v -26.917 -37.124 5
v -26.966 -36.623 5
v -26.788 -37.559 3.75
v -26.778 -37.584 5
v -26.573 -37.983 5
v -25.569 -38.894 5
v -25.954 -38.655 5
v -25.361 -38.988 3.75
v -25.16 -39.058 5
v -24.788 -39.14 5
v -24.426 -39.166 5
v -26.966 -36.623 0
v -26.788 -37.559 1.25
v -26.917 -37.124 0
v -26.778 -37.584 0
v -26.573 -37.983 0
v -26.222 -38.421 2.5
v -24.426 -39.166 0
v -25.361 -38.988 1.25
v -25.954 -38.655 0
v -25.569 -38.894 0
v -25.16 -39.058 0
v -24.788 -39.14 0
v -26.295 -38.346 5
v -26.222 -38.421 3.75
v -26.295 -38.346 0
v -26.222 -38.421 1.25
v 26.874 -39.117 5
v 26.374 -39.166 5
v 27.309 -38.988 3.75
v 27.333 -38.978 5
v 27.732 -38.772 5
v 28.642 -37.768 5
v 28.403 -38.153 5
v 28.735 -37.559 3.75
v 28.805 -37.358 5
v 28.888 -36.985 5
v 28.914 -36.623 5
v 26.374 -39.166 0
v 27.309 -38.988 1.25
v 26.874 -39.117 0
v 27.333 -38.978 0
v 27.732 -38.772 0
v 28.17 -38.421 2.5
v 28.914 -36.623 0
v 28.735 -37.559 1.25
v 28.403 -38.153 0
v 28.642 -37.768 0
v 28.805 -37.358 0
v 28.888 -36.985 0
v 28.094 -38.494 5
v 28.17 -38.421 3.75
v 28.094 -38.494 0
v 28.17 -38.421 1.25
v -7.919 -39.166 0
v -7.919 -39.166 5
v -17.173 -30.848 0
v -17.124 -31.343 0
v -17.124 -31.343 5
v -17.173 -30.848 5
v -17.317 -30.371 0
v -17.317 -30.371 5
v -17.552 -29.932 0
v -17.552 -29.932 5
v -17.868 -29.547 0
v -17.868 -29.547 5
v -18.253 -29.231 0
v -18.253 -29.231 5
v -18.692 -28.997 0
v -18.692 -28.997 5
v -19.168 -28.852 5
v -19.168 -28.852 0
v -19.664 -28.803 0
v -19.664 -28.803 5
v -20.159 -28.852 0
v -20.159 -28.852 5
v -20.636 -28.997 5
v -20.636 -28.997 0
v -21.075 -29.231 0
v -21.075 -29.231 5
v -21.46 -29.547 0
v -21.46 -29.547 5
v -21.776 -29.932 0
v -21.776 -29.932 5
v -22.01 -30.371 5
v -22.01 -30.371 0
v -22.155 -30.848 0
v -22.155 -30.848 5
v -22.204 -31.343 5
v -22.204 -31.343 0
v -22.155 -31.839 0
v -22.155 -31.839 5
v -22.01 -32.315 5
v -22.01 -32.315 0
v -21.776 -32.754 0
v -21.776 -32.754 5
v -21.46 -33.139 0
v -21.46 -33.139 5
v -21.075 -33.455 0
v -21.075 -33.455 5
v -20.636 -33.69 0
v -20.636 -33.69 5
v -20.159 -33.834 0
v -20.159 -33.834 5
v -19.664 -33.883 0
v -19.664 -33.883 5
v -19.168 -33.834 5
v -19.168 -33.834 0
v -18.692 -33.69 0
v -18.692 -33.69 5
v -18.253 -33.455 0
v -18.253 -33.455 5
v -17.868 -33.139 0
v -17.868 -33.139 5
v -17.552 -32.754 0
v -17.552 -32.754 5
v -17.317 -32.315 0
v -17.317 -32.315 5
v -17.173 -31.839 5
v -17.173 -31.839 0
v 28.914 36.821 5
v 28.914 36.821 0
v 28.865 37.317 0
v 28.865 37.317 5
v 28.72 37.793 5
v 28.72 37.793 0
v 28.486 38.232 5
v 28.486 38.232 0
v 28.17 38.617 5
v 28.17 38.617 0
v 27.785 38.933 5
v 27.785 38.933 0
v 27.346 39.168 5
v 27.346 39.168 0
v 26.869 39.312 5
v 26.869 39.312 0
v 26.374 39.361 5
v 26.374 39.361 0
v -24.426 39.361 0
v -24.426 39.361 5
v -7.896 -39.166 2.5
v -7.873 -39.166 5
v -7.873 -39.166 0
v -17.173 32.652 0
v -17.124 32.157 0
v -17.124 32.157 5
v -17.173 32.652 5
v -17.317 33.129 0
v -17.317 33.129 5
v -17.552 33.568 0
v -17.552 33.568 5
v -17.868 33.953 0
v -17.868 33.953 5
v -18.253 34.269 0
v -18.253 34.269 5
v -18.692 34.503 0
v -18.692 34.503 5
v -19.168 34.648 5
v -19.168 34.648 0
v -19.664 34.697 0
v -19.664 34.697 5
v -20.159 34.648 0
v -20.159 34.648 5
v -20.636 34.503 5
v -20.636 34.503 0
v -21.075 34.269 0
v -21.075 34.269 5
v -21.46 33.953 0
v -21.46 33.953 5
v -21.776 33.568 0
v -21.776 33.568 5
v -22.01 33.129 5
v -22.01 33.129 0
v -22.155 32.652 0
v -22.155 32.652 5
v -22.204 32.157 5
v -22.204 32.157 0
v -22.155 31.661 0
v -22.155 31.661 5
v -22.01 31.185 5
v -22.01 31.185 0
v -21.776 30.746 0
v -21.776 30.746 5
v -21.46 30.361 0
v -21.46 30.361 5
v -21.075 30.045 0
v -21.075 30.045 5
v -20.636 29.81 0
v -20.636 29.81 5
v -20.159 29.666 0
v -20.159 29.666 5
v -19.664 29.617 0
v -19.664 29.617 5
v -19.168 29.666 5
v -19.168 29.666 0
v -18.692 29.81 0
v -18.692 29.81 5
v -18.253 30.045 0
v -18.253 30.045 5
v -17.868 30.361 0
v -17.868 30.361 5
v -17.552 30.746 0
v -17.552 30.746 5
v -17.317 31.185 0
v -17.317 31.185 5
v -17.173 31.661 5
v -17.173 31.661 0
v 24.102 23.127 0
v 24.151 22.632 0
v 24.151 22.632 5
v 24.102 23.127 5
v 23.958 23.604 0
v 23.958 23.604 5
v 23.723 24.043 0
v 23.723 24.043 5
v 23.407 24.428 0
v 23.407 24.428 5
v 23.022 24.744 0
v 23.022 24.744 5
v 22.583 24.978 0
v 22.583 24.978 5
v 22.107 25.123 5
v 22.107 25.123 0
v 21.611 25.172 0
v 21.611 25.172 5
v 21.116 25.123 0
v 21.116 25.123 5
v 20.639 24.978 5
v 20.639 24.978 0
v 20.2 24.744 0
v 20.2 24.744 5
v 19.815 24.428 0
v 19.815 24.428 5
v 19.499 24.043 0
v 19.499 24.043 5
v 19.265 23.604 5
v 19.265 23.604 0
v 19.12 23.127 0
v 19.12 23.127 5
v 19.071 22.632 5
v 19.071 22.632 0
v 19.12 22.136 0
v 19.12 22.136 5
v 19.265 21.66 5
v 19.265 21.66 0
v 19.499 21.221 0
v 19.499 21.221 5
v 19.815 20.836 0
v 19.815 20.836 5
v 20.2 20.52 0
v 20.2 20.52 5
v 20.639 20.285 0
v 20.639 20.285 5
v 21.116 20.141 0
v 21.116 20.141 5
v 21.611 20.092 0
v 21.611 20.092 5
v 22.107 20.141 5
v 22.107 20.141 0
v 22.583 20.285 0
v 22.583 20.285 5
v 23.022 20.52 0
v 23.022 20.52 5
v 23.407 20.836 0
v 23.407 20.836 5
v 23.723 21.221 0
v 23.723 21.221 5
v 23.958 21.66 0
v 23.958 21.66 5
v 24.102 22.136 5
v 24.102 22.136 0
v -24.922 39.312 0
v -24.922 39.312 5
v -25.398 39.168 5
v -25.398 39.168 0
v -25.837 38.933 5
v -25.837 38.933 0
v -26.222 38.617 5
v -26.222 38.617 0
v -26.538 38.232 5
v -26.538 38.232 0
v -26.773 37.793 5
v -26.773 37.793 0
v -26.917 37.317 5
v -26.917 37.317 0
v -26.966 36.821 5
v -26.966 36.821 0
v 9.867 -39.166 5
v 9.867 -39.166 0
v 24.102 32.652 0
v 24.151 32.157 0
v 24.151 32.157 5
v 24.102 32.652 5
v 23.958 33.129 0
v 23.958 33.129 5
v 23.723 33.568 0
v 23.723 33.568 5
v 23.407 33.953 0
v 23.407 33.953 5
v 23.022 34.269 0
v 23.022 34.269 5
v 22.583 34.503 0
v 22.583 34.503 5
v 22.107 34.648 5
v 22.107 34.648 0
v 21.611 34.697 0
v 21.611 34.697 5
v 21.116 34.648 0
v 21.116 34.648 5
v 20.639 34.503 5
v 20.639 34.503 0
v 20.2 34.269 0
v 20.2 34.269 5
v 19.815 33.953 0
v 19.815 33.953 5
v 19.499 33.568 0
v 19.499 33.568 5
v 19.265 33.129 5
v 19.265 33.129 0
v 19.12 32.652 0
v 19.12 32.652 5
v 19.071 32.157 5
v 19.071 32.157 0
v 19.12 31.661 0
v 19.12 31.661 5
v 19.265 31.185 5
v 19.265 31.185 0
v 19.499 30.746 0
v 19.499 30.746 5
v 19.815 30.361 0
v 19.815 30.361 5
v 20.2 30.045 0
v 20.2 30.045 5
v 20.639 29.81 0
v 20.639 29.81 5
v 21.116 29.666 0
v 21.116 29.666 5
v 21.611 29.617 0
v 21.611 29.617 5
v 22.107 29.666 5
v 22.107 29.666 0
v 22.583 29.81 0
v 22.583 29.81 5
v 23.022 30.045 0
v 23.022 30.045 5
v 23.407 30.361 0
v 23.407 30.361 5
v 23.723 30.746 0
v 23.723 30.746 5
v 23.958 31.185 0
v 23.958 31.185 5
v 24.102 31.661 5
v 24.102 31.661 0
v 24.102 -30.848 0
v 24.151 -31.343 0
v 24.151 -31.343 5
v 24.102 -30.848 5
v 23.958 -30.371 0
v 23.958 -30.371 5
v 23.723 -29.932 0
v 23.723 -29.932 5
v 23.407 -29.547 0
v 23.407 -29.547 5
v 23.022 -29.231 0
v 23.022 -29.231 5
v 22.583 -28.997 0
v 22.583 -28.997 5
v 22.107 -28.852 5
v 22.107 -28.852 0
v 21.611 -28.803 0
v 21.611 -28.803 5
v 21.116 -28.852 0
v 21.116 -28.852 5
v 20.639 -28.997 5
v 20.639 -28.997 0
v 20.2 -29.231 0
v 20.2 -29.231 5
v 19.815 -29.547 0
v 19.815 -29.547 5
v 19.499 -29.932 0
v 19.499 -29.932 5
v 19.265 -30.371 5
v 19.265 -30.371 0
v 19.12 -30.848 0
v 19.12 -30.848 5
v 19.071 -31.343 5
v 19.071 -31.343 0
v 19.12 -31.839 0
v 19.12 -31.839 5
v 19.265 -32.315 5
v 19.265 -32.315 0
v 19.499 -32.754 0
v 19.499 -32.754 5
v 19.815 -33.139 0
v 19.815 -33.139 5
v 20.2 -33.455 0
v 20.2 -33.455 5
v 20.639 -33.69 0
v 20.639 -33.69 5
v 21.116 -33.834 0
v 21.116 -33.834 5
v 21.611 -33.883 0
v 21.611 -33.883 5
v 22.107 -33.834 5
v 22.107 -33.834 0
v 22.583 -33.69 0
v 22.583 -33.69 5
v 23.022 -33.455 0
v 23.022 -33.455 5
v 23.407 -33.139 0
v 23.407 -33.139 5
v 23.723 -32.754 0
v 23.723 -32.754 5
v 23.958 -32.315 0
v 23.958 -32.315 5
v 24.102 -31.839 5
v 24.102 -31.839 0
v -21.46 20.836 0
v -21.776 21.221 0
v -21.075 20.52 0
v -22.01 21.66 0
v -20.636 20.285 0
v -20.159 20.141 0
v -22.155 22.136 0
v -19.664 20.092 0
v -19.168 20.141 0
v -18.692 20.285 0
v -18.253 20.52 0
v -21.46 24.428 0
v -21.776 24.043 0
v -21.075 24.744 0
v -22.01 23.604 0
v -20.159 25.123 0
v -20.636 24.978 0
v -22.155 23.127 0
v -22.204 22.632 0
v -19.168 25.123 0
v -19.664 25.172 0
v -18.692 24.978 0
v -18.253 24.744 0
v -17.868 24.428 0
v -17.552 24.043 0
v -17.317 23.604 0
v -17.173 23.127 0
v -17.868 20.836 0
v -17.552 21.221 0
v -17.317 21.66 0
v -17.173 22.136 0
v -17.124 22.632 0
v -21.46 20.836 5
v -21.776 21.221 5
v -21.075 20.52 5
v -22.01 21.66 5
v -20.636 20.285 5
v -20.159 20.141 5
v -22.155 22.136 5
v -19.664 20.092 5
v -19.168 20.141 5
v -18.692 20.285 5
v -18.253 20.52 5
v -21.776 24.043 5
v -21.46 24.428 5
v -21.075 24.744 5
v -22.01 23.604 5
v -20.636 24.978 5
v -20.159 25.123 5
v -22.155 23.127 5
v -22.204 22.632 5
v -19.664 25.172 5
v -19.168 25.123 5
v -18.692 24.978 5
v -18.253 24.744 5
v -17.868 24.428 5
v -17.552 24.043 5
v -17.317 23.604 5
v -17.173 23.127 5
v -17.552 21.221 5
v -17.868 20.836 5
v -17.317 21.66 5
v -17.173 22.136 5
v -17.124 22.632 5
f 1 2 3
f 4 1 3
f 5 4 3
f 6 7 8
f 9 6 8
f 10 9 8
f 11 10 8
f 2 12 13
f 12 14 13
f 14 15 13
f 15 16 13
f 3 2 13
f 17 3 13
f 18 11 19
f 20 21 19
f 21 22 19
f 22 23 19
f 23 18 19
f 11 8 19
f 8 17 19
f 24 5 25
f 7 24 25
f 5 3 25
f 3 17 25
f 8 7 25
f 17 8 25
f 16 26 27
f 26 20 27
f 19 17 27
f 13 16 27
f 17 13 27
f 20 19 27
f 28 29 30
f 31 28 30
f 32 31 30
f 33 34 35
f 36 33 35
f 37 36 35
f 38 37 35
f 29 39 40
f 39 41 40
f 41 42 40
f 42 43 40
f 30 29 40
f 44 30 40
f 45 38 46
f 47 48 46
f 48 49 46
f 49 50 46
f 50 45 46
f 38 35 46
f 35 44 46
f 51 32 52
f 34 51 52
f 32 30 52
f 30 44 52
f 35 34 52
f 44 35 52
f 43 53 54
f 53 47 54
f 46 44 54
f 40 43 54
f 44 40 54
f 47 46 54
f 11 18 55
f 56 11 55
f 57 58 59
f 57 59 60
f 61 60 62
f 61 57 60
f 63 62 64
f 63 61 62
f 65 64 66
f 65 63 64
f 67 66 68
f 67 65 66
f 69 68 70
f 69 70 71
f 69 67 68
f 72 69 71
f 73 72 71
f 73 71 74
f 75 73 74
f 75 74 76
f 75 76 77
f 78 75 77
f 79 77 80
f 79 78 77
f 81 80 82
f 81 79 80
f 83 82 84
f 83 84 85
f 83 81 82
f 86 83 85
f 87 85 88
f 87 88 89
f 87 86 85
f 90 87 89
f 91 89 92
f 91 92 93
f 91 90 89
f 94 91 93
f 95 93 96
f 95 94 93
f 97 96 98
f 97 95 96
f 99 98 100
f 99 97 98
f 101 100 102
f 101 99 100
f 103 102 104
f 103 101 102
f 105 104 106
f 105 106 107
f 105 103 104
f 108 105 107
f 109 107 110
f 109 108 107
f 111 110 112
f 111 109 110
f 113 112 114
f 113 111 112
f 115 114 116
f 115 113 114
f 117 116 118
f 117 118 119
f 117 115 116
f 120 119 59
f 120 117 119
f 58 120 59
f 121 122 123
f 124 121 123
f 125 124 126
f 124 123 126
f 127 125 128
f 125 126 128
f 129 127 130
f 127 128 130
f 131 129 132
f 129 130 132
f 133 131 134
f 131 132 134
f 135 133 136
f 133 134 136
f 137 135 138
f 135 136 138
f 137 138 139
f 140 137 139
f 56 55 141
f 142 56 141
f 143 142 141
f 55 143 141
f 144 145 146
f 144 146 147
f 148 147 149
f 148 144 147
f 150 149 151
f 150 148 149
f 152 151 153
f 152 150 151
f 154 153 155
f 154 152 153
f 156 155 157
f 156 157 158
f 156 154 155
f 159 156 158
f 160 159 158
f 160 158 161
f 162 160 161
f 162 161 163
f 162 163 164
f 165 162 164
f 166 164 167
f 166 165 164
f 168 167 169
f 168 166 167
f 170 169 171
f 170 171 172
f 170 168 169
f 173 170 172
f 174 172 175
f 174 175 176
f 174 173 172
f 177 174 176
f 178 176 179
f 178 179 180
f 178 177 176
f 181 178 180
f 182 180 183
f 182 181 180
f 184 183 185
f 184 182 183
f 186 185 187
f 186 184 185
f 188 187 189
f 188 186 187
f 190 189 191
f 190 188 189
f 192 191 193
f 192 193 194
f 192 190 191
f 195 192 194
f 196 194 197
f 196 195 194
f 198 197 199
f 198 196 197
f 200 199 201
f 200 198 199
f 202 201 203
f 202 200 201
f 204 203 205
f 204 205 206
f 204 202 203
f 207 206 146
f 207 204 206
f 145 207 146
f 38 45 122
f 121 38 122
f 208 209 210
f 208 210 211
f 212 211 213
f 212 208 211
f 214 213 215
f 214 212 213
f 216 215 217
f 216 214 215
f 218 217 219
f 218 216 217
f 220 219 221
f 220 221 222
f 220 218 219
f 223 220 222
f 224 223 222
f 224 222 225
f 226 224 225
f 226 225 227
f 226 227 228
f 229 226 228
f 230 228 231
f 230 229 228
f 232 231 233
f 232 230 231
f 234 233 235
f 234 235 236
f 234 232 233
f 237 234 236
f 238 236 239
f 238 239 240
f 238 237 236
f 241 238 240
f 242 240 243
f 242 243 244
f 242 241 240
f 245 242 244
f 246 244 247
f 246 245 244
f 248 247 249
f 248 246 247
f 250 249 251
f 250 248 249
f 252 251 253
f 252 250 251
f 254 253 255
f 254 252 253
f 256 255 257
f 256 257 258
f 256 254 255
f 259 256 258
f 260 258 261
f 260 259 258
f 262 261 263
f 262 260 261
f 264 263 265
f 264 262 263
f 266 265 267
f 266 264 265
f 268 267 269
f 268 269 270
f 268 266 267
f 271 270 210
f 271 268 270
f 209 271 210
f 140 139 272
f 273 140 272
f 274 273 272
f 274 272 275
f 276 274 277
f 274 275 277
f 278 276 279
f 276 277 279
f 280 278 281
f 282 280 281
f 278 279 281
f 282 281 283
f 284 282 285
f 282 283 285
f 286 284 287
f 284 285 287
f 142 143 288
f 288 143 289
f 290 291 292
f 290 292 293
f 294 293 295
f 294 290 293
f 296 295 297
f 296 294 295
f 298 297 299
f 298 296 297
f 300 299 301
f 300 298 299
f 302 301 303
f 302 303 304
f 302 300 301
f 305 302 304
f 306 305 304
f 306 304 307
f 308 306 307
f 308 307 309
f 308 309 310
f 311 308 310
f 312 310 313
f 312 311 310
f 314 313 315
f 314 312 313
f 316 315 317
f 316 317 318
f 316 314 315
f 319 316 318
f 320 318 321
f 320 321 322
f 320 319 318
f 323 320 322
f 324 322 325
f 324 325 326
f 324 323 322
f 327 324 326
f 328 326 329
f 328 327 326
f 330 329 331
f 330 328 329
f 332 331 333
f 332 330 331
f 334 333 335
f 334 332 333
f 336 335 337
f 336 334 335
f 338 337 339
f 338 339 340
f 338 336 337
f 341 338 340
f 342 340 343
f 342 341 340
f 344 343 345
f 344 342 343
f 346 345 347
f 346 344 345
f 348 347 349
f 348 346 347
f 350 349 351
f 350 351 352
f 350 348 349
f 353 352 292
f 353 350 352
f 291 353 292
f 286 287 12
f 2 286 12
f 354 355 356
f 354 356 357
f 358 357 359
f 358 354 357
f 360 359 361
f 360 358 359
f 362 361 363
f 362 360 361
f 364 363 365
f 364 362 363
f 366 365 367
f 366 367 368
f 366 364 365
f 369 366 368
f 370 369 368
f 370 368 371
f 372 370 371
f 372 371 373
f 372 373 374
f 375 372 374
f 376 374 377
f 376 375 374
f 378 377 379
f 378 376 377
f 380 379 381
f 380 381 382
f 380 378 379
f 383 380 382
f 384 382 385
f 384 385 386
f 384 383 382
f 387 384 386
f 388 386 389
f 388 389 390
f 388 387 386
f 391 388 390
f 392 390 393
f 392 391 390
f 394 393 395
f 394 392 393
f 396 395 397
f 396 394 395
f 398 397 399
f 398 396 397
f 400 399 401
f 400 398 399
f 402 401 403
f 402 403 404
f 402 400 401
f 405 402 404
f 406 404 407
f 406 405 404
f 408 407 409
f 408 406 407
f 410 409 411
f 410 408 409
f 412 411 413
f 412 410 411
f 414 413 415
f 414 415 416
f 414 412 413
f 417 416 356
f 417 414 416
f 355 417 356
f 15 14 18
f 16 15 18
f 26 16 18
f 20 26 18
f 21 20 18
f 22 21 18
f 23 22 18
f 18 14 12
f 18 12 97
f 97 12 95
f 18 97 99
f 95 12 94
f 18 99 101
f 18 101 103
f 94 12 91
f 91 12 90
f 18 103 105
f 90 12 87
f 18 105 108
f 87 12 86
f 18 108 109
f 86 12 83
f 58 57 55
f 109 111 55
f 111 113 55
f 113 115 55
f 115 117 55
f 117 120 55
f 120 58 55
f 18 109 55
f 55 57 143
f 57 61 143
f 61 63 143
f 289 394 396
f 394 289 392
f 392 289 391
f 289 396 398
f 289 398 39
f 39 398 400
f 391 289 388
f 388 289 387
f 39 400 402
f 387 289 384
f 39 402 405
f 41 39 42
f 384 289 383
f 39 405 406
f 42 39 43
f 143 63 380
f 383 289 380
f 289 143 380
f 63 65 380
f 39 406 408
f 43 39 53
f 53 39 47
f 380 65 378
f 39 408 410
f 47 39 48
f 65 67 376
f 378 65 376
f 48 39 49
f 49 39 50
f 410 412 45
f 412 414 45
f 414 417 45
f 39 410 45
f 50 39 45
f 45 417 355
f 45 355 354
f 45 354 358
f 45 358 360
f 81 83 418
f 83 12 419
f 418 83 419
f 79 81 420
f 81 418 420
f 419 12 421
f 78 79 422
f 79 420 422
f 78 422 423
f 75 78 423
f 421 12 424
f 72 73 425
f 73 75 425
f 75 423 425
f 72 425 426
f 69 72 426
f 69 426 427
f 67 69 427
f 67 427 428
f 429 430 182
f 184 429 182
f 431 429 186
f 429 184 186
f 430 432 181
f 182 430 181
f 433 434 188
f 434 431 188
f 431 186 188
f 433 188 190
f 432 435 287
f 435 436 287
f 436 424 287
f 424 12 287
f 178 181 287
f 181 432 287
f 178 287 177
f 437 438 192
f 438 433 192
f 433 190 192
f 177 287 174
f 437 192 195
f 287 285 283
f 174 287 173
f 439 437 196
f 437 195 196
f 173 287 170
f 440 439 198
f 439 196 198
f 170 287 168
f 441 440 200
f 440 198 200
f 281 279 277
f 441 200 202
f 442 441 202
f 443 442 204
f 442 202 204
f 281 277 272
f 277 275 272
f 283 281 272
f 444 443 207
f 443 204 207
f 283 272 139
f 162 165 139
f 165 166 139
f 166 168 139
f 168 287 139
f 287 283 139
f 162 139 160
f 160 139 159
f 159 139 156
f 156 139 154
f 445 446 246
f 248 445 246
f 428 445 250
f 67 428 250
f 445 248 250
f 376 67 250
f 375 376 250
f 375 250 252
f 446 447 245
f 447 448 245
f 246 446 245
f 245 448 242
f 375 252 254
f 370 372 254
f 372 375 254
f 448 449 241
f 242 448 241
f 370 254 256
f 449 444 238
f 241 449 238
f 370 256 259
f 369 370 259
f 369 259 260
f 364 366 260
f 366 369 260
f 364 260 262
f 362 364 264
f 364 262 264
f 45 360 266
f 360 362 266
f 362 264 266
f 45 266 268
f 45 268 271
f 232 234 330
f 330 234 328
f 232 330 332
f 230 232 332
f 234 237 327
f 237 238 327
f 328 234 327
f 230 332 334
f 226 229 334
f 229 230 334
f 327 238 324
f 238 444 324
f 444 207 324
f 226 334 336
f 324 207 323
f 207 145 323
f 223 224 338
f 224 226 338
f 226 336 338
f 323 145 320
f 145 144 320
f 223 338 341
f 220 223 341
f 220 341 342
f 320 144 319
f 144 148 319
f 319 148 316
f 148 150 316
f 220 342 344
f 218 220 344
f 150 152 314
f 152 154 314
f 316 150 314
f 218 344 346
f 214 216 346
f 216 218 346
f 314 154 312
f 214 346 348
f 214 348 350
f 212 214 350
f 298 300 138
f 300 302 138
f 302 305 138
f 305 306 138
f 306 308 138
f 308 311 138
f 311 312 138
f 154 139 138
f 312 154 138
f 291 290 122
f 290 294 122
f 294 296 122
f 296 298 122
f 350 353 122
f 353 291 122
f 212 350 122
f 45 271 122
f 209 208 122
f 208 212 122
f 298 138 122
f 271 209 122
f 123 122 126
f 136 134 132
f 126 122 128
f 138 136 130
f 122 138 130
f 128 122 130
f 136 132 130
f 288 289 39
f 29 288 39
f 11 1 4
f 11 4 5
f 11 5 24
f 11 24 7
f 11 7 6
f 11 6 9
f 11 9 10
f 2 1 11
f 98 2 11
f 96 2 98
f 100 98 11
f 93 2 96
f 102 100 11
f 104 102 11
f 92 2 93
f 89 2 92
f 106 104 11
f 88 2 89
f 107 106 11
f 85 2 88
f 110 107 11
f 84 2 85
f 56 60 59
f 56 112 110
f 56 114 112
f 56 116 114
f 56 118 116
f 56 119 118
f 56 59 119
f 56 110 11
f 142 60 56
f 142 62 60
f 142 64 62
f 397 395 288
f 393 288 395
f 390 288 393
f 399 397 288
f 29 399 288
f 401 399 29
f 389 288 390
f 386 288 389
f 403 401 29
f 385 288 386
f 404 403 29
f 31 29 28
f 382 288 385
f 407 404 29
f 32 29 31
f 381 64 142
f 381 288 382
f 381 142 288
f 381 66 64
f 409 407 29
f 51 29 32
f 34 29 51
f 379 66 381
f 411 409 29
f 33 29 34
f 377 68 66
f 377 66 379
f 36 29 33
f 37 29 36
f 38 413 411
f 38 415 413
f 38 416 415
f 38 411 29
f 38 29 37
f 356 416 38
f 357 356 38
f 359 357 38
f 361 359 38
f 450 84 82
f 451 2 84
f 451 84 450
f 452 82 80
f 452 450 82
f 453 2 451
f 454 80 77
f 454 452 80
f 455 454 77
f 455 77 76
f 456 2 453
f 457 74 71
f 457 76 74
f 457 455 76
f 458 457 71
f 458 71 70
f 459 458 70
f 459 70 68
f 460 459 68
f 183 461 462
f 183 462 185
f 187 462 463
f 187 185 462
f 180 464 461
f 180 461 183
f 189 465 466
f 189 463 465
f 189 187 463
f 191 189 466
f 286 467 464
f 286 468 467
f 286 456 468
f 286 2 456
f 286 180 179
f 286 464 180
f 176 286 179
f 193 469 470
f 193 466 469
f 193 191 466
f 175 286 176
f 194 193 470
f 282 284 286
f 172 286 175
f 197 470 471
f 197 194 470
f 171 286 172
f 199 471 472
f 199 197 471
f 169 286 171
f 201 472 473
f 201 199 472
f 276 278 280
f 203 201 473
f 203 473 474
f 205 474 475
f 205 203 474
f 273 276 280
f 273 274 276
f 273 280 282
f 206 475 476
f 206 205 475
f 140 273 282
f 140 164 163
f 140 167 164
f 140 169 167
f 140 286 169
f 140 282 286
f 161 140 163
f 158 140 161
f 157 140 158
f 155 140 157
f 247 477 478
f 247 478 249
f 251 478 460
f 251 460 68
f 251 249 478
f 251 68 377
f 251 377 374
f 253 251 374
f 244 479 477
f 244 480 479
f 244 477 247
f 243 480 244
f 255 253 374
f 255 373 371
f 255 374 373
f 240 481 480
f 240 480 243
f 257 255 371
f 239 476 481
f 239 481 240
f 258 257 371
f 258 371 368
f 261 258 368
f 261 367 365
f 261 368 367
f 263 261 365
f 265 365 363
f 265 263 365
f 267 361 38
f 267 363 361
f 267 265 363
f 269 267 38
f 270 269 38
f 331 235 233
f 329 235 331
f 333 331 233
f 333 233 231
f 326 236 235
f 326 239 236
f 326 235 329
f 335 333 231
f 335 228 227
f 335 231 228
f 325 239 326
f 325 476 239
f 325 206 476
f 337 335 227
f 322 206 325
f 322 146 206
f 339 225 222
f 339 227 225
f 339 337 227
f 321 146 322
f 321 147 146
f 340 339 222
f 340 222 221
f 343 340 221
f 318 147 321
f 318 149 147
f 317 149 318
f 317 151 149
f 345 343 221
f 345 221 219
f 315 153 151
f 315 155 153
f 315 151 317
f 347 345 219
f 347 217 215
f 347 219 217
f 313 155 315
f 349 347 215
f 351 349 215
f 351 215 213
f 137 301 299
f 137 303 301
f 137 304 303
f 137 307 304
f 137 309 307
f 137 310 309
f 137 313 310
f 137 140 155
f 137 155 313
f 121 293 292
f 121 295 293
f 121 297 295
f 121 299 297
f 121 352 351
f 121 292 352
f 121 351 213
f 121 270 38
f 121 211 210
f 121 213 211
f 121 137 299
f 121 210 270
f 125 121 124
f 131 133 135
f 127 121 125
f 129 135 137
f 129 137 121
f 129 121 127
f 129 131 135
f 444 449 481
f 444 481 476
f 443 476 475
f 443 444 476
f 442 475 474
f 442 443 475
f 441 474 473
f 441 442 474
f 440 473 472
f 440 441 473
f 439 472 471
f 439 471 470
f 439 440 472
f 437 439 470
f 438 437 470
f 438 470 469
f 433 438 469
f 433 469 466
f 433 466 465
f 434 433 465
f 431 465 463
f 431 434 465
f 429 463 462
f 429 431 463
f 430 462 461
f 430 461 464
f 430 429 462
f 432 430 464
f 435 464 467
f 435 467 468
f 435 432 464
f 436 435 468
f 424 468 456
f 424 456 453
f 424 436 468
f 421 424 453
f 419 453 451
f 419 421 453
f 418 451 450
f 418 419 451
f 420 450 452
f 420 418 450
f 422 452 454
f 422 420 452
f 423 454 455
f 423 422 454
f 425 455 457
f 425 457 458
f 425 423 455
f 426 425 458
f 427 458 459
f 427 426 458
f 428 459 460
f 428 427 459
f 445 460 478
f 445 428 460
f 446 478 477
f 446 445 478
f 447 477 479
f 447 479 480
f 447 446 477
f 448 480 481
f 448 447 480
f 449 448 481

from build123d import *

# Parameters (mm, degrees)
SKIZZE1_R                       = 2.54
AUFSATZ_LINEAR_AUSTRAGEN1_DEPTH = 5


with BuildPart() as part:
    # Skizze1 → Aufsatz-Linear austragen1 (new body)
    with BuildSketch(Plane.XY):
        with BuildLine():
            Line((9.866806535, -39.166387358), (26.373711346, -39.166387358))
            add(Edge.make_bspline(
                [(26.373711346, -39.166387358), (28.913711346, -39.166387358), (28.913711346, -36.622901599)],
                knots=[3.141592654, 3.141592654, 3.141592654, 4.71238898, 4.71238898, 4.71238898], degree=2, weights=[1, 0.707106781, 1]))
            Line((28.913711346, -36.622901599), (28.913711346, 36.821129628))
            ThreePointArc((28.913711346, 36.821129628), (28.169762571, 38.617180852), (26.373711346, 39.361129628))
            Line((26.373711346, 39.361129628), (-24.426288654, 39.361129628))
            ThreePointArc((-24.426288654, 39.361129628), (-26.222339878, 38.617180852), (-26.966288654, 36.821129628))
            Line((-26.966288654, 36.821129628), (-26.966288654, -36.622901599))
            add(Edge.make_bspline(
                [(-26.966288654, -36.622901599), (-26.966288654, -39.166387358), (-24.426288654, -39.166387358)],
                knots=[1.570796327, 1.570796327, 1.570796327, 3.141592654, 3.141592654, 3.141592654], degree=2, weights=[1, 0.707106781, 1]))
            Line((-24.426288654, -39.166387358), (-7.919383842, -39.166387358))
            add(Edge.make_bspline(
                [(-7.919383842, -39.166387358), (-7.896041529, -39.166387358), (-7.872713398, -39.165529461)],
                knots=[0.586855187, 0.586855187, 0.586855187, 0.623588271, 0.623588271, 0.623588271], degree=2, weights=[1, 0.99983134, 1]))
            Line((-7.872713398, -39.165529461), (9.866806535, -39.166387358))
        make_face()
        with Locations((-19.663788654, -31.343187358)):
            Circle(SKIZZE1_R, mode=Mode.SUBTRACT)
        with Locations((21.611211346, -31.343187358)):
            Circle(SKIZZE1_R, mode=Mode.SUBTRACT)
        with Locations((21.611211346, 32.156812642)):
            Circle(SKIZZE1_R, mode=Mode.SUBTRACT)
        with Locations((21.611211346, 22.631812642)):
            Circle(SKIZZE1_R, mode=Mode.SUBTRACT)
        with Locations((-19.663788654, 22.631812642)):
            Circle(SKIZZE1_R, mode=Mode.SUBTRACT)
        with Locations((-19.663788654, 32.156812642)):
            Circle(SKIZZE1_R, mode=Mode.SUBTRACT)
    extrude(amount=AUFSATZ_LINEAR_AUSTRAGEN1_DEPTH)


solid = part.part
